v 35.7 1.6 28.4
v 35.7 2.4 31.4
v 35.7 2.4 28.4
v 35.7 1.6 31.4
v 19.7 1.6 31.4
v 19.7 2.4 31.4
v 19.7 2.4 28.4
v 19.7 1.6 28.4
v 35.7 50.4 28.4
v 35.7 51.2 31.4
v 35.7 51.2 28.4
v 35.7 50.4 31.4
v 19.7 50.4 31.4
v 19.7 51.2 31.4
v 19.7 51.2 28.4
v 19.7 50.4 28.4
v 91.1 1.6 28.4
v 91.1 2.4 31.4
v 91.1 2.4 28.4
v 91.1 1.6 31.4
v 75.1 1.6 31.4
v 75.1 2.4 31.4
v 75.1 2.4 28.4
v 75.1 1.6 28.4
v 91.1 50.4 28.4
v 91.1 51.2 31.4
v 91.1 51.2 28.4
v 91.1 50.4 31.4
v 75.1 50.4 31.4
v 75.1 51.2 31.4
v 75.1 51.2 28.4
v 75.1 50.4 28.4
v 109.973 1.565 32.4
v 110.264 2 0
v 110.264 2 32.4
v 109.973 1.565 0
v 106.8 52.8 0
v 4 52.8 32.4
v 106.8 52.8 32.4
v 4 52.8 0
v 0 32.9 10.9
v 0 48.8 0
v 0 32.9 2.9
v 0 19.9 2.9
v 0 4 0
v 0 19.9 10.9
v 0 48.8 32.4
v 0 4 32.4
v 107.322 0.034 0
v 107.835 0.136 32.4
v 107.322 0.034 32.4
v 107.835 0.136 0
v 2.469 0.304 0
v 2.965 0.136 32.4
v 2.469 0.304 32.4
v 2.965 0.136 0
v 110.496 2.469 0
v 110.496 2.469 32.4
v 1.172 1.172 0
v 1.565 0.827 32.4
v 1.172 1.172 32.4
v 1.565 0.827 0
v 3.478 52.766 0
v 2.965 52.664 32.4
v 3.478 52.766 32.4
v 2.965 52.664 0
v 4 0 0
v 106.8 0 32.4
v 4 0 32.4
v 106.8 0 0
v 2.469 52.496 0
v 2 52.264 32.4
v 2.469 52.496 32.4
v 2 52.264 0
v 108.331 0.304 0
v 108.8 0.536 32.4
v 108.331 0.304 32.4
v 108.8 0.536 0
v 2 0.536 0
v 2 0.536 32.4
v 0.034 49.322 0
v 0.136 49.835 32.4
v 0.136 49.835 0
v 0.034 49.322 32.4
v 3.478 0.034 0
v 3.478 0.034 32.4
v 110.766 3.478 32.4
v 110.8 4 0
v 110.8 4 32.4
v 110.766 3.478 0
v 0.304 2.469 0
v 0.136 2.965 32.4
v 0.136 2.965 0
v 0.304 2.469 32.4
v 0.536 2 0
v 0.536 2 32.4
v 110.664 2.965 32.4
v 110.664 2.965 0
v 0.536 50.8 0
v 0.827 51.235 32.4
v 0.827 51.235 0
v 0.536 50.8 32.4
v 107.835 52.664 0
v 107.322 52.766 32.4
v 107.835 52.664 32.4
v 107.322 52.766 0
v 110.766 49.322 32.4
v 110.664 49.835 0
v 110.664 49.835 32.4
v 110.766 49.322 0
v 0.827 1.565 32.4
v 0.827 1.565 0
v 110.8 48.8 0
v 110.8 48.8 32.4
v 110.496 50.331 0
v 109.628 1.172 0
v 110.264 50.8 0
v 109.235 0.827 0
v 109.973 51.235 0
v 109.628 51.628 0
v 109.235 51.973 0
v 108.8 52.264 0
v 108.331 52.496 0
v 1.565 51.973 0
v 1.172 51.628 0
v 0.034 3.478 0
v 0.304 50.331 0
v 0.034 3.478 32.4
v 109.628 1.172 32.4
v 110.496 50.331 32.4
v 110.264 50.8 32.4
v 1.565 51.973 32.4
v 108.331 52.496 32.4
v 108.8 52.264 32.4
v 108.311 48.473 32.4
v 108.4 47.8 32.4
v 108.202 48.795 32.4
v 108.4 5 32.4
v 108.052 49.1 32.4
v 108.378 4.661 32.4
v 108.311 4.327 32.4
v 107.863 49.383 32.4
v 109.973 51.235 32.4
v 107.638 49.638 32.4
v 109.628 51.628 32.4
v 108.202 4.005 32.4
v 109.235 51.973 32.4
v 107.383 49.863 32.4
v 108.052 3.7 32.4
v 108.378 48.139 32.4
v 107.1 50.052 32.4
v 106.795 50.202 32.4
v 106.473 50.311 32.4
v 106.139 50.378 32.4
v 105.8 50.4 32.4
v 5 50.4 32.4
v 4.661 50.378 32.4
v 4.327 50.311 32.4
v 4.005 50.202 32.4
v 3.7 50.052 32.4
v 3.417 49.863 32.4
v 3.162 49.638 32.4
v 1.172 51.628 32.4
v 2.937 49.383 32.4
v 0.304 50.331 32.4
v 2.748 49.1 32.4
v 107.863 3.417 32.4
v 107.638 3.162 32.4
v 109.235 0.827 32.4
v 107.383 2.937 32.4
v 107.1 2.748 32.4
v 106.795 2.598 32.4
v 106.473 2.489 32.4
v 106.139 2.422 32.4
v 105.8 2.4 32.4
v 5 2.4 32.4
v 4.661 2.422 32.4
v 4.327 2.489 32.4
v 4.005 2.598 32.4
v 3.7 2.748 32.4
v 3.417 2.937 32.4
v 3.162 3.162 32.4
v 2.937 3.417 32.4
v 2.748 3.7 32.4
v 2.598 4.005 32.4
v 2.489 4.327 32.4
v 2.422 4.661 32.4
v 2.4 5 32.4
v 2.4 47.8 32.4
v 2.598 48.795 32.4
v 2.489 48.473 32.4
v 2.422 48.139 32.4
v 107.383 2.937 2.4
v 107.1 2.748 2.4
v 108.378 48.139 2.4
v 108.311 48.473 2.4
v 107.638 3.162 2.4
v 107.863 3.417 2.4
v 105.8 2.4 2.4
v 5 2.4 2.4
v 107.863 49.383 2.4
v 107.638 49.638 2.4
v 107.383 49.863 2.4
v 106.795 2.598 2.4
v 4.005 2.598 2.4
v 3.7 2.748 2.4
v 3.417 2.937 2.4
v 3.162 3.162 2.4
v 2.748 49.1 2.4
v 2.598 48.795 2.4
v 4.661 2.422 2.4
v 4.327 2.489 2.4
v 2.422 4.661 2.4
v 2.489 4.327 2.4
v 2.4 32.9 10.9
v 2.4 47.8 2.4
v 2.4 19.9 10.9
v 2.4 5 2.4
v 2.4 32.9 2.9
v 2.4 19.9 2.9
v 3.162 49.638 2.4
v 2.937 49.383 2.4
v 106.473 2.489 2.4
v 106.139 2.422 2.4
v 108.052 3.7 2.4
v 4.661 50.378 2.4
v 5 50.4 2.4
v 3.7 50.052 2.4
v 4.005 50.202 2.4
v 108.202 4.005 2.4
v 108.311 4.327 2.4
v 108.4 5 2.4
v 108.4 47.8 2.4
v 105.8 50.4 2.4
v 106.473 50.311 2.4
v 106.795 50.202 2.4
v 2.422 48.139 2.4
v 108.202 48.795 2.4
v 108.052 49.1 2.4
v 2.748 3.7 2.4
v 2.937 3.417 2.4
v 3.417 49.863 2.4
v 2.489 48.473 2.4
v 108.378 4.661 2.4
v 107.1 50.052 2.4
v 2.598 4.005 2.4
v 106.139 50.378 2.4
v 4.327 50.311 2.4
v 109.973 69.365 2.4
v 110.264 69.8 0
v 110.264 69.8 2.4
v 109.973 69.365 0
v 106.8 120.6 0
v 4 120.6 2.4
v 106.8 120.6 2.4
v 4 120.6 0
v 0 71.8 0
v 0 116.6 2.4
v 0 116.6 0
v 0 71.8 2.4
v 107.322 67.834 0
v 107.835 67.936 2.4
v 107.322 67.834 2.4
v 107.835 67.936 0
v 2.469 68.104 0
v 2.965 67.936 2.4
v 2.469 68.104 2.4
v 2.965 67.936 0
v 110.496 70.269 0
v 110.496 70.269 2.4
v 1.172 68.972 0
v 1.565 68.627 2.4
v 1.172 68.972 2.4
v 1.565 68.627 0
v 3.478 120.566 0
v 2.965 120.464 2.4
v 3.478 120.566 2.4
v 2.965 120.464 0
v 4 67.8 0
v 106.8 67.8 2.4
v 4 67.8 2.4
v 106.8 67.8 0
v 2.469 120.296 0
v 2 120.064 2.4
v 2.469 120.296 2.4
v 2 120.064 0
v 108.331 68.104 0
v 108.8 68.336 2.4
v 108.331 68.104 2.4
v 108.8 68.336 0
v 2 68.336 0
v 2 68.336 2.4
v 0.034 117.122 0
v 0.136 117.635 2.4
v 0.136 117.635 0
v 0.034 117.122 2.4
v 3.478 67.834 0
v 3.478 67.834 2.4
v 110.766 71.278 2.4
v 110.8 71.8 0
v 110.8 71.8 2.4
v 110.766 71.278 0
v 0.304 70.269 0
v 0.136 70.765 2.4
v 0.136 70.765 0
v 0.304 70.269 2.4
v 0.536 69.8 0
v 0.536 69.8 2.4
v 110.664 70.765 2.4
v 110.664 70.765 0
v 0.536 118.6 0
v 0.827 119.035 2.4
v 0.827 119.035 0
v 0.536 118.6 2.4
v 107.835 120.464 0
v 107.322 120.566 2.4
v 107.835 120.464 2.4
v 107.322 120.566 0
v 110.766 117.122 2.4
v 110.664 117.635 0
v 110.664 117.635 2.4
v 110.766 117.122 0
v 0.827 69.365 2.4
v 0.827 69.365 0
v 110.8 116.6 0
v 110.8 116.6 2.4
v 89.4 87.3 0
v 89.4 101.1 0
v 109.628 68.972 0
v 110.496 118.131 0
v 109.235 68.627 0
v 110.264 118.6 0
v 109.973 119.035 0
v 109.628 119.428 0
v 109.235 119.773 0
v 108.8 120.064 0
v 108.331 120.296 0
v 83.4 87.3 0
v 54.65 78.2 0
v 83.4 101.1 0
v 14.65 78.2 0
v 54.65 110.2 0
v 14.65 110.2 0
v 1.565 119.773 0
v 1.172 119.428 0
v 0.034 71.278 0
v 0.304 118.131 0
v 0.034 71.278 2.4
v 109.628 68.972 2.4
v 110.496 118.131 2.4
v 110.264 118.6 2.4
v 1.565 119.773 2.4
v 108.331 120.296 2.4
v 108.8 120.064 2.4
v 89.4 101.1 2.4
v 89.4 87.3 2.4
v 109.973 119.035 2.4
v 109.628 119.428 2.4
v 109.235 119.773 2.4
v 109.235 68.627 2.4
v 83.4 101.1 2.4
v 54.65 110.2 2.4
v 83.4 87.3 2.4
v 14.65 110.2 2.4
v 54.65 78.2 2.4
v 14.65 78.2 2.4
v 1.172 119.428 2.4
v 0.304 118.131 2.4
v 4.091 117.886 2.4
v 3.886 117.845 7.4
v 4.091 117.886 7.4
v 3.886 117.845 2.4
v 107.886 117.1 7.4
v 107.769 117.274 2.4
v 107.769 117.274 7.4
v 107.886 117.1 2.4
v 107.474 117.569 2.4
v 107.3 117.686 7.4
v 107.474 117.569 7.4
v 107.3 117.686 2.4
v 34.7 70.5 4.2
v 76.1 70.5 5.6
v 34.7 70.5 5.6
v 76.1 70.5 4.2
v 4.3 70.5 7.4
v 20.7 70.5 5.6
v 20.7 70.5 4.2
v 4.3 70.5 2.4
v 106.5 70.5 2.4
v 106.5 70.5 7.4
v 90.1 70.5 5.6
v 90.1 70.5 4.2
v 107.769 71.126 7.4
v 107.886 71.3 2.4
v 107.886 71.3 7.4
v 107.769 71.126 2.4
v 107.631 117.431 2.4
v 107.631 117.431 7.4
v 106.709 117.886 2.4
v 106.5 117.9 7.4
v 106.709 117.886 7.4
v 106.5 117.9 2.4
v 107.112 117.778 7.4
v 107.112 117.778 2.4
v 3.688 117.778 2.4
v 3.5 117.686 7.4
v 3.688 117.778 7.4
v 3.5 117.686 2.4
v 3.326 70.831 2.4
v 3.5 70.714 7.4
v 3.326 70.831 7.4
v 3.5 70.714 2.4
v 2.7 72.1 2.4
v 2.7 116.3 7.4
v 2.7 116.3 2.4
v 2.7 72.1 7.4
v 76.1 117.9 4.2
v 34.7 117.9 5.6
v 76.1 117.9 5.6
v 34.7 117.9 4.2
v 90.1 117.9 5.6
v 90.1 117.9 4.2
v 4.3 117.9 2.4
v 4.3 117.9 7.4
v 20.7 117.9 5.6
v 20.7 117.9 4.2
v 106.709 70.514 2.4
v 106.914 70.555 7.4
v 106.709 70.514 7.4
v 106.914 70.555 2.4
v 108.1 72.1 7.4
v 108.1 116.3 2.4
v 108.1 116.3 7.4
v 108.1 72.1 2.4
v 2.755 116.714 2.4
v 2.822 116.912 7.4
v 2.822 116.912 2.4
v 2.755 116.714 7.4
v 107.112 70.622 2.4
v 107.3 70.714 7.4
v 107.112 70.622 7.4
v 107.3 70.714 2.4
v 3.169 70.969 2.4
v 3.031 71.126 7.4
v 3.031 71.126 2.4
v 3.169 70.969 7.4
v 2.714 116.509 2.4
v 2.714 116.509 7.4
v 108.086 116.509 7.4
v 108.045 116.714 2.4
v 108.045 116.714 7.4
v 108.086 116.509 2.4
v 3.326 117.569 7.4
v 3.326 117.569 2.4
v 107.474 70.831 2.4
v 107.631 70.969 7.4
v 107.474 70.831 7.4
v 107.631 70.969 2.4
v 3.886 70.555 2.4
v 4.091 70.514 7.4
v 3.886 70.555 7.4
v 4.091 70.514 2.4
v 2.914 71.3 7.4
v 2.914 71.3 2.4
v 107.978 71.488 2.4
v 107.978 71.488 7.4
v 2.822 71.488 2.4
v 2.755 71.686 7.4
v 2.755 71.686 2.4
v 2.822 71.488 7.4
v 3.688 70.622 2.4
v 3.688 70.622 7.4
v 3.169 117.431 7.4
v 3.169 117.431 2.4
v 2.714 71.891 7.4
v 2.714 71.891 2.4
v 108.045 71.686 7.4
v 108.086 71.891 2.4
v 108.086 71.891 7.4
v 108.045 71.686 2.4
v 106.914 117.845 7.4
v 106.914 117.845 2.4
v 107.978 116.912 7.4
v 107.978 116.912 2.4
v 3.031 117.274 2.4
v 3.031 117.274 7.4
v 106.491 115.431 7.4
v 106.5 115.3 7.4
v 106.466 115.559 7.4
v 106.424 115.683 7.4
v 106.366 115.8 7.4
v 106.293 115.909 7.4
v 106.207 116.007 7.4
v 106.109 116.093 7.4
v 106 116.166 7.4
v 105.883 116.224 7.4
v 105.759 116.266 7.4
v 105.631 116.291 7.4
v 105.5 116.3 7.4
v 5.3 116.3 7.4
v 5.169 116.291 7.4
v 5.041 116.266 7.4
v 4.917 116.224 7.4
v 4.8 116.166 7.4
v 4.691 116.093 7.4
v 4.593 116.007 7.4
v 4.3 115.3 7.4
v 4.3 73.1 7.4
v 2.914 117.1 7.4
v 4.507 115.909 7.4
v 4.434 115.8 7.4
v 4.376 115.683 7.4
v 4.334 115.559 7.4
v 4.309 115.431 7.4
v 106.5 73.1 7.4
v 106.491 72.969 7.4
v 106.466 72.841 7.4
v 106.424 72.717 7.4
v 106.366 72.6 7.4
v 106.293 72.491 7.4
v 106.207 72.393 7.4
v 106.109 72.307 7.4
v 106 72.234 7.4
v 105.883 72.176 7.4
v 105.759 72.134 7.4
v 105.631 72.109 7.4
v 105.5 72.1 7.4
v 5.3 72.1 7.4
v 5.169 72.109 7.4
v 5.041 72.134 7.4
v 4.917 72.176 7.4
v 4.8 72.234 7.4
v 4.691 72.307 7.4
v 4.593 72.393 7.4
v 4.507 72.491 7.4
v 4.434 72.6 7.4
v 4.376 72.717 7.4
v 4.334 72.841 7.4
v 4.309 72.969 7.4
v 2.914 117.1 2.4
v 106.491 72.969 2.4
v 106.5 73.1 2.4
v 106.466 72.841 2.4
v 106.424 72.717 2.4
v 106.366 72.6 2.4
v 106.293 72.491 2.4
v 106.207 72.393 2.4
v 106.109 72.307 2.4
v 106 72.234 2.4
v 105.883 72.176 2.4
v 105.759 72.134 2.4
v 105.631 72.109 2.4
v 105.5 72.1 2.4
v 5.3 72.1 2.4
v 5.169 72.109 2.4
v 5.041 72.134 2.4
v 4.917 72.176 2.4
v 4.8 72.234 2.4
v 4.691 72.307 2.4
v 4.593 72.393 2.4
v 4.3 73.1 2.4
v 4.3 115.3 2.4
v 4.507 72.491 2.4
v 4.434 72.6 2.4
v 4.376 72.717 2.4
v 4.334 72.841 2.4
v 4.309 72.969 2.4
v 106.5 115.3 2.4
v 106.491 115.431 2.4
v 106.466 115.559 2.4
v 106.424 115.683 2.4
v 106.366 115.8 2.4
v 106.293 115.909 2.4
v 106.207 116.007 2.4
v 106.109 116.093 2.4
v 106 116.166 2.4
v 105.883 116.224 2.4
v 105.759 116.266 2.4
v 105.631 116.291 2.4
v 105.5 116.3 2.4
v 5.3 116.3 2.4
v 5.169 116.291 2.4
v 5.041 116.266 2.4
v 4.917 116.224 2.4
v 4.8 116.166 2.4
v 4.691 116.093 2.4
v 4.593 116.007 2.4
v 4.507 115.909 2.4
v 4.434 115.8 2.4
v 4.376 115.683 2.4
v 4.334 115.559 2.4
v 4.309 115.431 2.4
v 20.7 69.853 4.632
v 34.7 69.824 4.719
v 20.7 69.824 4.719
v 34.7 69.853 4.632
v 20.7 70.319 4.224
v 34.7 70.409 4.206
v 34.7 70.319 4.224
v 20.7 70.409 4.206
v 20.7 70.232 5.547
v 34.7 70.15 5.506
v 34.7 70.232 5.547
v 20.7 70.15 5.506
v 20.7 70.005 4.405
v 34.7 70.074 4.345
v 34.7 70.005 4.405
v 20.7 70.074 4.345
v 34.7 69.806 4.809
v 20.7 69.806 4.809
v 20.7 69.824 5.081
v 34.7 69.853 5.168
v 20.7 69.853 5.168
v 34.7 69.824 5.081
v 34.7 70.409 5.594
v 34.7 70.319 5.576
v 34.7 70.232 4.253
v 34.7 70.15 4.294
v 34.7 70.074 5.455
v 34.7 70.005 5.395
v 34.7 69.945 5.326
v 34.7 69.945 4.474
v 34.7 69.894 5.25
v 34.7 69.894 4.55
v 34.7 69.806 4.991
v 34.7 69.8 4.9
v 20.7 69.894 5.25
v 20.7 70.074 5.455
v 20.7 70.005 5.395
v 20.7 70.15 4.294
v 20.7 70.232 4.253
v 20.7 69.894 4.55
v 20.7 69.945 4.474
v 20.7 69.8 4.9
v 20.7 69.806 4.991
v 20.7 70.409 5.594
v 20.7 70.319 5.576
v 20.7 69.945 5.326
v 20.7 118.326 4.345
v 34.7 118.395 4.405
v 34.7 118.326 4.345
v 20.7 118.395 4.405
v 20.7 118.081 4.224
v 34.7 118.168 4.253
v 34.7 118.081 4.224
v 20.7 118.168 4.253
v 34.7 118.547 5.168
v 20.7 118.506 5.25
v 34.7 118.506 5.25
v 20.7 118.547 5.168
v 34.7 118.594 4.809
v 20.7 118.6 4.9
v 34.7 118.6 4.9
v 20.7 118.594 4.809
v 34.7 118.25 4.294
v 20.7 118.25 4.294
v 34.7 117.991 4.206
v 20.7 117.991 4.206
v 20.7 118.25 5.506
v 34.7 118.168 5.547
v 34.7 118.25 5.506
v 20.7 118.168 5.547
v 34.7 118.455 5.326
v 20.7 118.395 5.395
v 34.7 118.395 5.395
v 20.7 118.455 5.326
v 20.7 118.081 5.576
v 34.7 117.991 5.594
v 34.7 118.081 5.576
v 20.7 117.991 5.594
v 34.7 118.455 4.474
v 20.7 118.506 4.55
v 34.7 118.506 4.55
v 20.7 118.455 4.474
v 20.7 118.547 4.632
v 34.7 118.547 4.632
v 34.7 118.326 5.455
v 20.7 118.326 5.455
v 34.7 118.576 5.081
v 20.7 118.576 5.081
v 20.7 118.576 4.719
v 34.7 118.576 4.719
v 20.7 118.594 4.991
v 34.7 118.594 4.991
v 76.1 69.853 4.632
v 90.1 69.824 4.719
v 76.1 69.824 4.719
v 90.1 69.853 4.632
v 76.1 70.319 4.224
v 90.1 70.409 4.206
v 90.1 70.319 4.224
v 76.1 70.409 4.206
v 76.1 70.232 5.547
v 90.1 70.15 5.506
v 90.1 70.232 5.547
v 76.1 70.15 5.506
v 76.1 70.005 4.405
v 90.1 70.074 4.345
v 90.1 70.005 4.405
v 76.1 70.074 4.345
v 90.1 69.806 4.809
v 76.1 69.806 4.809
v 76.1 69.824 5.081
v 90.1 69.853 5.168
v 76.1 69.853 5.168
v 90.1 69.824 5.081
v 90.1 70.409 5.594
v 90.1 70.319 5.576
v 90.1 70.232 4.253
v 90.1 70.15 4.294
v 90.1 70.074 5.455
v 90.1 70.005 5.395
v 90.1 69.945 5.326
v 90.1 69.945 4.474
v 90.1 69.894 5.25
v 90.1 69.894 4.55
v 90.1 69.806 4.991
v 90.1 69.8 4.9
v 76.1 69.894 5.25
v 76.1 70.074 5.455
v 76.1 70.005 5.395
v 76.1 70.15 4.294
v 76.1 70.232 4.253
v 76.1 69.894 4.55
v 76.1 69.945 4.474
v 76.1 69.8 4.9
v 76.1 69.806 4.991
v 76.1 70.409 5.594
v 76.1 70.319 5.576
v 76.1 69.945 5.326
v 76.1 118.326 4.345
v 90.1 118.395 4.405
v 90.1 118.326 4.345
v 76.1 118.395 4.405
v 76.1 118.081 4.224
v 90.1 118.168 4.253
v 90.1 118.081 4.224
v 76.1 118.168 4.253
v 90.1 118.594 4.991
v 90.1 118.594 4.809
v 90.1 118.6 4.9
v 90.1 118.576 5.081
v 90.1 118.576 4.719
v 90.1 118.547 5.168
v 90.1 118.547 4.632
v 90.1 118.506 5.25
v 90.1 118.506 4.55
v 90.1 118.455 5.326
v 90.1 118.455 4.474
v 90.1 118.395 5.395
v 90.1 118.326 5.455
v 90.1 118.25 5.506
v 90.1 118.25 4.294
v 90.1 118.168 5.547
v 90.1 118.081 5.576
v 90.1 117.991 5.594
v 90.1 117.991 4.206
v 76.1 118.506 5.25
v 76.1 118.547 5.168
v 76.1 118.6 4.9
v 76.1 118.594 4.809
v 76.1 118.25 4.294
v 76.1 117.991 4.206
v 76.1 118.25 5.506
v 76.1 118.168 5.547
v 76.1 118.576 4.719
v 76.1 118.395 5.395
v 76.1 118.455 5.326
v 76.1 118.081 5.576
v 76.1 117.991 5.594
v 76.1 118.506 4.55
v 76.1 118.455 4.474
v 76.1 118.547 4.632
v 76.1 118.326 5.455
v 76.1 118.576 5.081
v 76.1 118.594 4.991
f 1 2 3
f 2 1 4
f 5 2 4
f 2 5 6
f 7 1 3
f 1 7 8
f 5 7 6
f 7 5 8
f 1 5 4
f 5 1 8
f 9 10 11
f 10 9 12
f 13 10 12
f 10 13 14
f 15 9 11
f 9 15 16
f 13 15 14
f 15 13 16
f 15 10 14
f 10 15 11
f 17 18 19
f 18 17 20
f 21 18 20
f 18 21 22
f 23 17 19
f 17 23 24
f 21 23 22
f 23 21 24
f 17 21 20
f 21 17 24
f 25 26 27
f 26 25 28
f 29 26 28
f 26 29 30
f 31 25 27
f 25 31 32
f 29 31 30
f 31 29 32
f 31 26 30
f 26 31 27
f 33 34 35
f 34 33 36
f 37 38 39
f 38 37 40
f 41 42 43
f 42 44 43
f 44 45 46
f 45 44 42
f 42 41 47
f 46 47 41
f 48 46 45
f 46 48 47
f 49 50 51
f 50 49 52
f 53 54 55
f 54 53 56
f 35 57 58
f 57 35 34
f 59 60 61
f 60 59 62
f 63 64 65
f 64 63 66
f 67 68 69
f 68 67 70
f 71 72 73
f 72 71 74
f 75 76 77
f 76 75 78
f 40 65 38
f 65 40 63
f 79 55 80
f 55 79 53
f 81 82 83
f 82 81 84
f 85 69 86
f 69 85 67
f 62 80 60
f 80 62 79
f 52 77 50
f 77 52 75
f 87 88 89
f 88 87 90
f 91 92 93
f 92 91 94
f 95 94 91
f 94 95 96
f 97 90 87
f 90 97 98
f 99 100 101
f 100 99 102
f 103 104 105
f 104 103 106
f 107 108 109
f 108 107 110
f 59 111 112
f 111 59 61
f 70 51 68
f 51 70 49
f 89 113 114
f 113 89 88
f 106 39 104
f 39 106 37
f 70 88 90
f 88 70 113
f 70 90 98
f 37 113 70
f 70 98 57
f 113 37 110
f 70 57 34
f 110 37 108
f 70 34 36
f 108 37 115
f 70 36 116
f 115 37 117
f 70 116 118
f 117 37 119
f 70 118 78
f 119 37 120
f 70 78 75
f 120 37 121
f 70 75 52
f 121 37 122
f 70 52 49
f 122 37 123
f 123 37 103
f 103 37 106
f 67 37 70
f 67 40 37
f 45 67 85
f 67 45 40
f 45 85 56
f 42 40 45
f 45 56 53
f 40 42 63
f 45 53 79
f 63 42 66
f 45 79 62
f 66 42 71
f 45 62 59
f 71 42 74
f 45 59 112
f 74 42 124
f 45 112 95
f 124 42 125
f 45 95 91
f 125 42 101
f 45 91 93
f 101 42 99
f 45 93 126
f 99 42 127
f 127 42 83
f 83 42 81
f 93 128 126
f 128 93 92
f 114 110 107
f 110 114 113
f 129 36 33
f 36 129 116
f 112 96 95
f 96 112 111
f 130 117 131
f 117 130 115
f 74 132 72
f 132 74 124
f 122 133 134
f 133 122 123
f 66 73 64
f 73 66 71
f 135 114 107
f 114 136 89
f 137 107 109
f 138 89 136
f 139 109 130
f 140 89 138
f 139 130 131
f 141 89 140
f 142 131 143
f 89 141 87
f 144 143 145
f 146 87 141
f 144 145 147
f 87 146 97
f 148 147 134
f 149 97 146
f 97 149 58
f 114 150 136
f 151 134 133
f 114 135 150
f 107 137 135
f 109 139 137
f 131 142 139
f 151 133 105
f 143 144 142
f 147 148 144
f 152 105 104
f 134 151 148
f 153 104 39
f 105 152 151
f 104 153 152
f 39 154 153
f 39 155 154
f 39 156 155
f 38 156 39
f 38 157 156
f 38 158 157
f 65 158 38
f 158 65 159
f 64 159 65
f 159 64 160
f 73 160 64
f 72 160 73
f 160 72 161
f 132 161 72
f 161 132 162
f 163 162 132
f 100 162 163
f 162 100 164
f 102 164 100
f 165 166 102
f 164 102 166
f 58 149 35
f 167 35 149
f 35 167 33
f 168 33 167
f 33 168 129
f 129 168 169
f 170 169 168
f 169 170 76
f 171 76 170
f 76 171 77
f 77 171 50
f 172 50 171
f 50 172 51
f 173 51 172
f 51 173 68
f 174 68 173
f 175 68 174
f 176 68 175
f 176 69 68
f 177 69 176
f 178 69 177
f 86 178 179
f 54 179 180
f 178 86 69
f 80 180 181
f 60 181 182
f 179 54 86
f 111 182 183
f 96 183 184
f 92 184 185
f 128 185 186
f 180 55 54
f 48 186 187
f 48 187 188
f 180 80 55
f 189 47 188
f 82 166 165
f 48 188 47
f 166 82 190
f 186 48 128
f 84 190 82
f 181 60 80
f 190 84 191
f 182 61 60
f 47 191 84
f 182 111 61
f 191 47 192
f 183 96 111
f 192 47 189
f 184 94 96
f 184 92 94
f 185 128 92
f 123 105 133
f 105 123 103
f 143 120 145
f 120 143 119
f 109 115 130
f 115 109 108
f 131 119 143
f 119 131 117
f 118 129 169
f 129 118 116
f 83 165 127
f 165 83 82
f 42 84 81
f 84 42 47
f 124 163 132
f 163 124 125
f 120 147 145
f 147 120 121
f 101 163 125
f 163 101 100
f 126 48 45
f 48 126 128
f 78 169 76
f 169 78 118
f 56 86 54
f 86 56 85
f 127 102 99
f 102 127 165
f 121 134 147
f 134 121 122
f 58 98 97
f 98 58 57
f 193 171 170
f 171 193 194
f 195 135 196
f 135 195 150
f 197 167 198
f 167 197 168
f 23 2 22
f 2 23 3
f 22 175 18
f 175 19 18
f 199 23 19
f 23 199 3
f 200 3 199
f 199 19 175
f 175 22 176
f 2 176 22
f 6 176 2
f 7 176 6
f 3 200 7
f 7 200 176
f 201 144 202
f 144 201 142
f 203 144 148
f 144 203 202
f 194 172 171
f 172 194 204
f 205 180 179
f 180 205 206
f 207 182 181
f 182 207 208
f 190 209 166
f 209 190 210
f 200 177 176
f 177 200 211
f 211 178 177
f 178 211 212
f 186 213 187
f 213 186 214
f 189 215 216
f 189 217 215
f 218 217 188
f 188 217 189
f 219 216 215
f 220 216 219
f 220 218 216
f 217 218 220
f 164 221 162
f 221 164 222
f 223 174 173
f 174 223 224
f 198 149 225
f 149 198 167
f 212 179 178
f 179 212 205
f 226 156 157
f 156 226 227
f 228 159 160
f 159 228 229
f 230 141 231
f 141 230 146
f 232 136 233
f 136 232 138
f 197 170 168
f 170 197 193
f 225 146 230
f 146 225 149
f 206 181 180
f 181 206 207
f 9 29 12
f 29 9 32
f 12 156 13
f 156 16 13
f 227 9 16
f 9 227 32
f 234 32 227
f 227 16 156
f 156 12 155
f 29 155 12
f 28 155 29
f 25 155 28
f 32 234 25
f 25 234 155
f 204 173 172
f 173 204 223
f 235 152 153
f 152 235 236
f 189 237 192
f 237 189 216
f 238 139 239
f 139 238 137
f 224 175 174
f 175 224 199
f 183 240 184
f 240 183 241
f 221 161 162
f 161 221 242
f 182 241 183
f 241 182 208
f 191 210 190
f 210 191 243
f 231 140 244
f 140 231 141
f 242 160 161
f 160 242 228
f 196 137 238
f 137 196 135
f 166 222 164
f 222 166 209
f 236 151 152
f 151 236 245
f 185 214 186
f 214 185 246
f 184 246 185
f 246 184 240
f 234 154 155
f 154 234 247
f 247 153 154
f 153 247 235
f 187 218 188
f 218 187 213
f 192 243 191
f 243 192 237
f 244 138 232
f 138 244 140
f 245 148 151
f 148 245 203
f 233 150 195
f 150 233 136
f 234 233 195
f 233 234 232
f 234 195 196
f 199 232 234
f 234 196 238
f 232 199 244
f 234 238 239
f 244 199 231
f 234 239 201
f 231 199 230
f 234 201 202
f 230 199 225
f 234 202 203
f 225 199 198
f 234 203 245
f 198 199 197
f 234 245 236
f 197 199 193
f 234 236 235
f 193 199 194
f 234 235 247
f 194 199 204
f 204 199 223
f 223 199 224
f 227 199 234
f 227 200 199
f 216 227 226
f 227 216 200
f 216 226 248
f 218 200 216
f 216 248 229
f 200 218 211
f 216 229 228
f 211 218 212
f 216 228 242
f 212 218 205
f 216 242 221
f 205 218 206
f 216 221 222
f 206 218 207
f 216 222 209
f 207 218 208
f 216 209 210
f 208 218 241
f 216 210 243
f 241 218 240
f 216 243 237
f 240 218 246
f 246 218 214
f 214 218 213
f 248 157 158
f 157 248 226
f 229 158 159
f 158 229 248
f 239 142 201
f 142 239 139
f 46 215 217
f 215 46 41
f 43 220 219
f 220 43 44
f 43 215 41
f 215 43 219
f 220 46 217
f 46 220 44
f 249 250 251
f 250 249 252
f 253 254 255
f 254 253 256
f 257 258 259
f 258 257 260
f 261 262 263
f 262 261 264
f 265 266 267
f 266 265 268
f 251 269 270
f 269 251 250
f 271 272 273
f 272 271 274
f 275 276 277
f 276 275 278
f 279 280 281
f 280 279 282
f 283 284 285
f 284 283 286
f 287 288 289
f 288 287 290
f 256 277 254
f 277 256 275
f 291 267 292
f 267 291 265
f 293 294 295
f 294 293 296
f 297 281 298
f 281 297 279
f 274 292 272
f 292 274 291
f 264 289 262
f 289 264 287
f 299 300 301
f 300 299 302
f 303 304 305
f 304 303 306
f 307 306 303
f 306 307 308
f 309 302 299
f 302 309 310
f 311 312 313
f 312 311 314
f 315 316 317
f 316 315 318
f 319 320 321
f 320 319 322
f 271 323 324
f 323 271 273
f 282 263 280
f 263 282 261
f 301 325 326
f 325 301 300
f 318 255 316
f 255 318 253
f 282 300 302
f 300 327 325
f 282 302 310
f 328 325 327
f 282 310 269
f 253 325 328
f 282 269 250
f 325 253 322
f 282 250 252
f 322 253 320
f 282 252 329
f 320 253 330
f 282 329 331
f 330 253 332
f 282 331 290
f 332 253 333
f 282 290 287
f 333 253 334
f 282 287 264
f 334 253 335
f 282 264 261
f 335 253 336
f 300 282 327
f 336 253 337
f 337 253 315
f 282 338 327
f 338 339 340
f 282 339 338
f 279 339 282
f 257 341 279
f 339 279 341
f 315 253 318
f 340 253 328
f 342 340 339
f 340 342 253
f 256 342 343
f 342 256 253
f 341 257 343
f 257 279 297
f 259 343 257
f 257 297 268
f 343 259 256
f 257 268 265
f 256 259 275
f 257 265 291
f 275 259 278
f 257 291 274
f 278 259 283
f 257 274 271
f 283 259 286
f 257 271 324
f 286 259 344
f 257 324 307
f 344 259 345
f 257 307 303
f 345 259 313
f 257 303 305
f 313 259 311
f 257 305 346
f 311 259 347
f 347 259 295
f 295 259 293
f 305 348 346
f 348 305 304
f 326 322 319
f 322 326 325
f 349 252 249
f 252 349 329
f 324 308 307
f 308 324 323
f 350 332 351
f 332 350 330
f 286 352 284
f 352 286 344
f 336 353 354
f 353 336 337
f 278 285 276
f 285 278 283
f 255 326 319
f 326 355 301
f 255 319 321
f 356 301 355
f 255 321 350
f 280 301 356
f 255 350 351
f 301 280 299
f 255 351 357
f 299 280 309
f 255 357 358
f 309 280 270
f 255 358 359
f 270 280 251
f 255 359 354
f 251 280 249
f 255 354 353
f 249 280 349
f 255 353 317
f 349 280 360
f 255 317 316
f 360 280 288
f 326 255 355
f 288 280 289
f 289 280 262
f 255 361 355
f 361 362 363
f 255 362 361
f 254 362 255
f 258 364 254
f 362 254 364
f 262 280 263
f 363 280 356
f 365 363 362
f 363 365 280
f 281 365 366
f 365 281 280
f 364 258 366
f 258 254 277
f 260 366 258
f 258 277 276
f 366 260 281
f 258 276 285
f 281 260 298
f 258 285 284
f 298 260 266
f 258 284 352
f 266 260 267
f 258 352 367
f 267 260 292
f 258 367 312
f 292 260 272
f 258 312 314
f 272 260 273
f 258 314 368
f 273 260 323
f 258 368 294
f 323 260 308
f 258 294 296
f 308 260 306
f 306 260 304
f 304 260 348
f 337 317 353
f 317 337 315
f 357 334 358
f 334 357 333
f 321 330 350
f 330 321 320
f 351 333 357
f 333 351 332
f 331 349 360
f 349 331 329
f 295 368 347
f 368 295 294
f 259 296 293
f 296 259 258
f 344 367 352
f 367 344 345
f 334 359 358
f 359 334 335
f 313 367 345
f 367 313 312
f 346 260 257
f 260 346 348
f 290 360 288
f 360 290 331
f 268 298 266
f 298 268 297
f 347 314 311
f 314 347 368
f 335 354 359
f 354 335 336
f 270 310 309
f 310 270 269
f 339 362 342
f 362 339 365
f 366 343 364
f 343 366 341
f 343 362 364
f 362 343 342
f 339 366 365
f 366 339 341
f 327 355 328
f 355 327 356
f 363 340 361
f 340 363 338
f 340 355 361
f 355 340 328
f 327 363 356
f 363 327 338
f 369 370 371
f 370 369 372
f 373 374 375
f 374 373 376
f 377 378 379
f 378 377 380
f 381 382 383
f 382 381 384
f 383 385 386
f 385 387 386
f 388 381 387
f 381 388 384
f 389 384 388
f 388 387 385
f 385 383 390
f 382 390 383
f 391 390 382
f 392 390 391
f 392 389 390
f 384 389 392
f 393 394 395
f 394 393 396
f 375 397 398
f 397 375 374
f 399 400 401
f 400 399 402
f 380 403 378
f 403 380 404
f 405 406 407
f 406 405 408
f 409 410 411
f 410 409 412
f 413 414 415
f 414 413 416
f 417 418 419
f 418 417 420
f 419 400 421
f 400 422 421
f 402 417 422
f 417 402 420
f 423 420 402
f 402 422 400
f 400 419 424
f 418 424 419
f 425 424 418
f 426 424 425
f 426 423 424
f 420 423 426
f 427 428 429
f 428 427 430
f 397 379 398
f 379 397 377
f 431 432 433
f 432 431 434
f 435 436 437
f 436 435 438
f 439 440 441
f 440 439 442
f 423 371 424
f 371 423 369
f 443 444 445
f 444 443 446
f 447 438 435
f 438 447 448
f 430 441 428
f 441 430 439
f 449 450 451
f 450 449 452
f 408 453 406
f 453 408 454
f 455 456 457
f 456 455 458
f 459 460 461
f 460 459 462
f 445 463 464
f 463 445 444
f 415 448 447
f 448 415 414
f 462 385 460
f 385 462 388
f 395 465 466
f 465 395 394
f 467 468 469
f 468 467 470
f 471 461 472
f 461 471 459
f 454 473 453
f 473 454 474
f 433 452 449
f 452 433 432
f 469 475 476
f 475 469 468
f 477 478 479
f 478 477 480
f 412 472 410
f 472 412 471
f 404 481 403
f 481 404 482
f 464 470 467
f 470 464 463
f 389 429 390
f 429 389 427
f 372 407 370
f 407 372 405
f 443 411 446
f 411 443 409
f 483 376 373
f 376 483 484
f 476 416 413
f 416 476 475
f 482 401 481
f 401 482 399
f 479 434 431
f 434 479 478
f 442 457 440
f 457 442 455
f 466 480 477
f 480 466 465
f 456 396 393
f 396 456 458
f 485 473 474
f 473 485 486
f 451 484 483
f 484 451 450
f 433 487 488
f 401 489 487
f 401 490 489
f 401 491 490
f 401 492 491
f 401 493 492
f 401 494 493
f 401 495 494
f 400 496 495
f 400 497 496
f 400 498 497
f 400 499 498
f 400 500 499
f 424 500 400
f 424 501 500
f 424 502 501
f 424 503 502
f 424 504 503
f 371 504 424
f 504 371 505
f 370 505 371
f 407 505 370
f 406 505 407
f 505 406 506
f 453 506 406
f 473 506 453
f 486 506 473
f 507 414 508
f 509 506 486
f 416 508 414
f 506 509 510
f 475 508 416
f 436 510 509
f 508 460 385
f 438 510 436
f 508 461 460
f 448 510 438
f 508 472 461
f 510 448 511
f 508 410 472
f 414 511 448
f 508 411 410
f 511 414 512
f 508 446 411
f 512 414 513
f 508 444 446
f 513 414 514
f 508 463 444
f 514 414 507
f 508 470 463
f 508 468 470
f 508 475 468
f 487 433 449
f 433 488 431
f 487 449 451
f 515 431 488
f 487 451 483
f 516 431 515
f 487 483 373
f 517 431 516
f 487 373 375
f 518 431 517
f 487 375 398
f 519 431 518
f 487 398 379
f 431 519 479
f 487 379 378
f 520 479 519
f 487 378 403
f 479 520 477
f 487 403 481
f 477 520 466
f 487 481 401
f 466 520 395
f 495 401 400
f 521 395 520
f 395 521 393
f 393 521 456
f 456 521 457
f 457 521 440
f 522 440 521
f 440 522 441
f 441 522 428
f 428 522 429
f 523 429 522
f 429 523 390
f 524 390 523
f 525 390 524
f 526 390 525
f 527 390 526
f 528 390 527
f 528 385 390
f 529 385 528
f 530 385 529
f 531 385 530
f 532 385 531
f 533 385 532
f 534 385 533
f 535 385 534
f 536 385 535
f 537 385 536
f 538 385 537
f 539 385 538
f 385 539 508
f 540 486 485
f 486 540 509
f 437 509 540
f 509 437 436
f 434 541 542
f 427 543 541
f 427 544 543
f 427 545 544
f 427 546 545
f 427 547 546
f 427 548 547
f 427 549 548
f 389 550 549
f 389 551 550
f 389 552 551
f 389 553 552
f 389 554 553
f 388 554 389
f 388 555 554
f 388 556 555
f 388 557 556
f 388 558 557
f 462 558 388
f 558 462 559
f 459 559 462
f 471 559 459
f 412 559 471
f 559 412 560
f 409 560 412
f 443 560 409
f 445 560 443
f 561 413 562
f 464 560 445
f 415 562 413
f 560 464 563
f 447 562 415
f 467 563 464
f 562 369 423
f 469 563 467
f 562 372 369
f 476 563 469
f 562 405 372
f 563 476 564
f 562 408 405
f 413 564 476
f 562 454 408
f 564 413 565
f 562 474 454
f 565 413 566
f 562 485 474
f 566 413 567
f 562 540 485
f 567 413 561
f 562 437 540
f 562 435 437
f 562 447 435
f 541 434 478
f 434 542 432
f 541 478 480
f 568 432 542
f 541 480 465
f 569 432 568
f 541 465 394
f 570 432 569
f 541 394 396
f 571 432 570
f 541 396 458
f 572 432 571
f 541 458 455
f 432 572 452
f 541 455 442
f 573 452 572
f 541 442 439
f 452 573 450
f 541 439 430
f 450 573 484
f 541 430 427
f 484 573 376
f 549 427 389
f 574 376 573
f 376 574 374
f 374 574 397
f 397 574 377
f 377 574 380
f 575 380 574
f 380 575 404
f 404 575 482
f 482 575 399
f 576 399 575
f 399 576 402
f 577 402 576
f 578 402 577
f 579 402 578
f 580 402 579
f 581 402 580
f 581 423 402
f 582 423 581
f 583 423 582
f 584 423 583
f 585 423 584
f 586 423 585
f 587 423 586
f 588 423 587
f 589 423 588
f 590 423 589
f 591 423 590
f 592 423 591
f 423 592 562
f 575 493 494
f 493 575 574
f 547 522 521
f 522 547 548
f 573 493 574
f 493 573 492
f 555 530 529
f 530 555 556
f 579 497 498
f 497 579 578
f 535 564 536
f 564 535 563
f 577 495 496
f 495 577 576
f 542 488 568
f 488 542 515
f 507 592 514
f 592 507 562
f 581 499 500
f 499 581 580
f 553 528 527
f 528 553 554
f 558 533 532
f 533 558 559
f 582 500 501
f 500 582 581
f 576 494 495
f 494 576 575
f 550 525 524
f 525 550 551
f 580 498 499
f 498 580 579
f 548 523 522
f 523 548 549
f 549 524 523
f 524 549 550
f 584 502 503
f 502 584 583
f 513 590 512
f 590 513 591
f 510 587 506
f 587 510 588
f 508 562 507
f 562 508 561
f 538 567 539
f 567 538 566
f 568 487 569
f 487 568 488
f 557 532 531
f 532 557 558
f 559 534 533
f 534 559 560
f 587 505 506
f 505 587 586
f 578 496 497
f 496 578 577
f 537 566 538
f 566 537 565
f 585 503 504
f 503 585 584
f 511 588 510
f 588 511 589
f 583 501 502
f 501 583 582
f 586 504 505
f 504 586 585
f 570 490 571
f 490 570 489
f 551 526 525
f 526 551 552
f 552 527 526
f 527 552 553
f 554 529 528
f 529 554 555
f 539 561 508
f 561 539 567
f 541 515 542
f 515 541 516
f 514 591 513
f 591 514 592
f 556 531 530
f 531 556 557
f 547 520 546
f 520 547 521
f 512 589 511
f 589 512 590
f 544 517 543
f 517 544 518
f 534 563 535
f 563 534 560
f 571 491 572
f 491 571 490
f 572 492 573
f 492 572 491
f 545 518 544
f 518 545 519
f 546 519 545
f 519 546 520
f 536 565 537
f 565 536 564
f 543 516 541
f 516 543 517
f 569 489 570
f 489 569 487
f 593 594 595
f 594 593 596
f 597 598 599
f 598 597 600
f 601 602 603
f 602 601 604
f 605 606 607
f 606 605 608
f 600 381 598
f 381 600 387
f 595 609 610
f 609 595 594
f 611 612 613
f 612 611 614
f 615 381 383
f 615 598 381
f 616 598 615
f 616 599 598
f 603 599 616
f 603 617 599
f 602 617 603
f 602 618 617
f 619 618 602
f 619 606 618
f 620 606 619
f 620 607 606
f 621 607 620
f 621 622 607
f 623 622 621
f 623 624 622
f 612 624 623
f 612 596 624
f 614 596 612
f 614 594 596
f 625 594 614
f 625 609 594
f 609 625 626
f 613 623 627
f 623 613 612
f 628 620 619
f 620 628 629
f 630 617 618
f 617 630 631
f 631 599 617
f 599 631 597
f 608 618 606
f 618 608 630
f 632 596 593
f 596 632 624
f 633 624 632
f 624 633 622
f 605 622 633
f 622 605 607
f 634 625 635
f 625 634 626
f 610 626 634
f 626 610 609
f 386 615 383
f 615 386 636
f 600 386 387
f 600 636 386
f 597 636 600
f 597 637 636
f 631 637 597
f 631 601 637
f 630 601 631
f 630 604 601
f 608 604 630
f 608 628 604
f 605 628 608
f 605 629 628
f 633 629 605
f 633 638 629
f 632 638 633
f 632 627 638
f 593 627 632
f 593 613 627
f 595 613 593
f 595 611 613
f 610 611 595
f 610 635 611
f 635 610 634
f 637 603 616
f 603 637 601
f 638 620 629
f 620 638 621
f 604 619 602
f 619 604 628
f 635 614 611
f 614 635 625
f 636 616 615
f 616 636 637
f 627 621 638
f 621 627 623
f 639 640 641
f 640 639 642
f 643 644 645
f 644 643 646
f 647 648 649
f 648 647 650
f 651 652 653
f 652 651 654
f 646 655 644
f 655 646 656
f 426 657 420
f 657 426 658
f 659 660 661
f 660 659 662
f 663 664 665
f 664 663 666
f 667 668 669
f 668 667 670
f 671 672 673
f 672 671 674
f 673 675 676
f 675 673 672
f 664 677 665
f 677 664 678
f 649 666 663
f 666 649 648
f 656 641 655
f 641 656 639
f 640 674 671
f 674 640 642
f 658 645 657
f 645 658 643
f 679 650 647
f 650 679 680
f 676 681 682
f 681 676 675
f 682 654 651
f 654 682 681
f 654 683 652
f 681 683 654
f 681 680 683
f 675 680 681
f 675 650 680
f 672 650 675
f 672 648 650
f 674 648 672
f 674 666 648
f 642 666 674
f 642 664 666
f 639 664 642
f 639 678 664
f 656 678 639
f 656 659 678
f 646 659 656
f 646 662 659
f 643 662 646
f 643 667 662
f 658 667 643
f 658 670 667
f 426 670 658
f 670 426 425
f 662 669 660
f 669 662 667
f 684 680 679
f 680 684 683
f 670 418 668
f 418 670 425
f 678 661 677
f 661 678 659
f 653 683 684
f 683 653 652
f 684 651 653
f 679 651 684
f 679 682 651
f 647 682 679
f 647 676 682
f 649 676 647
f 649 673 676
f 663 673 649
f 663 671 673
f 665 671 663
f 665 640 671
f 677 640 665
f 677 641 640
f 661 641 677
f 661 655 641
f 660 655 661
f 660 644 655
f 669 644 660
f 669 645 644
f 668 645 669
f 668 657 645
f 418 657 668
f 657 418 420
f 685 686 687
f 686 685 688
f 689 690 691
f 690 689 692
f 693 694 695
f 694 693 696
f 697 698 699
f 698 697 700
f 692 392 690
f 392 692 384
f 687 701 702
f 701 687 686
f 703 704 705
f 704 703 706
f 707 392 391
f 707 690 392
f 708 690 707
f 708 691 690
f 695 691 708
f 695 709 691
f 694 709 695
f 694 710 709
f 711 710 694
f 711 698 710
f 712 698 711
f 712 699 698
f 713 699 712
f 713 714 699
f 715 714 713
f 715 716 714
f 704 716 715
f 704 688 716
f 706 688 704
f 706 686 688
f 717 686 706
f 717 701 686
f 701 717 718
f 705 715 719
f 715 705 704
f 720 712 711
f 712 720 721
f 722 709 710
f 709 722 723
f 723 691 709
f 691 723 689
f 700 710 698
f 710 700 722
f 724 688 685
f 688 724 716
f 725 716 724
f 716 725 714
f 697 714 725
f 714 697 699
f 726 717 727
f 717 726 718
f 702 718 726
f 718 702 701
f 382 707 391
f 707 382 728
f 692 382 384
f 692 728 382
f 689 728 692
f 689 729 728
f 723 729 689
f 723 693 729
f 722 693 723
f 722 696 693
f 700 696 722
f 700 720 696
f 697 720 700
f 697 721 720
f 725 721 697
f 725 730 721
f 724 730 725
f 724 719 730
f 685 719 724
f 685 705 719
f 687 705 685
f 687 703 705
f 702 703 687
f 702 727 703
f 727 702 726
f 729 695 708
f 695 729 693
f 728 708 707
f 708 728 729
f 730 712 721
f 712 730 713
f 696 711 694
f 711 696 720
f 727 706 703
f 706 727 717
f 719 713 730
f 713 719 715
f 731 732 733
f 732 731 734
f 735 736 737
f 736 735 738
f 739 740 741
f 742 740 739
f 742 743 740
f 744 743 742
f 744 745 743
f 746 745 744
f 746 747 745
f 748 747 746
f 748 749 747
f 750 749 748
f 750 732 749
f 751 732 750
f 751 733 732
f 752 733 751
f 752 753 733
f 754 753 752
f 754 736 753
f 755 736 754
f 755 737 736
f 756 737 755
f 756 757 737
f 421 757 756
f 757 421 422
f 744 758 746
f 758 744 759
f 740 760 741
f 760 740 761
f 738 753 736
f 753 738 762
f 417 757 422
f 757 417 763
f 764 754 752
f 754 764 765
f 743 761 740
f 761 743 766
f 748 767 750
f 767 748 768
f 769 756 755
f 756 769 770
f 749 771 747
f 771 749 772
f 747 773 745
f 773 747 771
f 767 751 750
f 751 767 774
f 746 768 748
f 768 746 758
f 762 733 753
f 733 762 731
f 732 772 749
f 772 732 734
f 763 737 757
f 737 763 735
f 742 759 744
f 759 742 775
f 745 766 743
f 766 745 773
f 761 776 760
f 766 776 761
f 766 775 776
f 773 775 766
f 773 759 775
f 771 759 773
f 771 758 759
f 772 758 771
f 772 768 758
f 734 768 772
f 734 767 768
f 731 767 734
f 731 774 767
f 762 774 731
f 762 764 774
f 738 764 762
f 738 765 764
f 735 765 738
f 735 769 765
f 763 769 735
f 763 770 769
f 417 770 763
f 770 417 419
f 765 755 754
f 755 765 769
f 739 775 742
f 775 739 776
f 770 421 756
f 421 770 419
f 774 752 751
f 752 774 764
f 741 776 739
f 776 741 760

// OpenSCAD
// Receiver enclosure - IoT Smart Safety Device
// NodeMCU ESP8266 + HC-12 + 1.8" SPI TFT
// Two parts, screw-free snap-fit lid. All dimensions in mm.
// mode: "print" (both parts flat), "assembled", "box", "lid"

mode = "print";

$fn = 48;

// ---------- component sizes ----------
nodemcu = [60, 35];
tft     = [60, 35];
hc12    = [28, 13];
tft_window = [40, 32];   // screen opening in the lid

// ---------- enclosure parameters ----------
wall  = 2.4;
floor_t = 2.4;
lid_t = 2.4;
Li = 106;                // inner length
Wi = 48;                 // inner width
Hi = 30;                 // inner height (wiring clearance)
R  = 4;                  // outer corner radius
clr = 0.3;               // lid-to-box clearance
lip_h = 5;
lip_w = 1.6;
gd = 0.8;                // snap groove depth
bump_d = 1.4;            // snap bump diameter
fit = 0.5;               // extra pocket clearance for boards

Lo = Li + 2*wall;
Wo = Wi + 2*wall;
Ho = floor_t + Hi;
// HC-12 mounted standing up (same as the transmitter): only its 13 mm width
// shows on top as a narrow slot; the antenna stands out of the slot.
hc_slot   = 6;            // opening width in the top surface = 0.6 cm
hc_len    = hc12[1] + 0.8; // slot length = module width + clearance
hc_gap    = 3.6;          // snug channel for the PCB, centred under the slot
hc_rib_t  = 2.2;          // thickness of each retaining rib
hc_stand  = false;        // true = add the retaining ribs for the HC-12 (removed, as on the transmitter)
hc_rib_h  = 14;           // ribs hang this far below the lid
hc_cx     = wall + 84;    // slot centre X (outer coords)
hc_cy     = Wo/2;         // slot centre Y

module rrect(l, w, h, r) {
    hull() for (x = [r, l-r], y = [r, w-r])
        translate([x, y, 0]) cylinder(r = r, h = h);
}

// ---------- BOX ----------
module box() {
    difference() {
        rrect(Lo, Wo, Ho, R);
        // cavity
        translate([wall, wall, floor_t]) rrect(Li, Wi, Hi + 1, R - wall + 1);
        // snap grooves (inner face of both long walls)
        for (gx = [Lo*0.25, Lo*0.75]) {
            translate([gx - 8, wall - gd, Ho - 4]) cube([16, gd + 0.01, 3]);
            translate([gx - 8, Wo - wall - 0.01, Ho - 4]) cube([16, gd + 0.01, 3]);
        }
        // micro-USB opening, short wall at NodeMCU end
        translate([-1, Wo/2 - 6.5, floor_t + 0.5])
            cube([wall + 2, 13, 8]);
    }
}

// ---------- LID (print orientation: outer face on the bed) ----------
module lid() {
    difference() {
        rrect(Lo, Wo, lid_t, R);
        // TFT window
        tx = wall + 2 + (tft[0] + fit - tft_window[0]) / 2;
        ty = Wo/2 - tft_window[1]/2;
        translate([tx, ty, -1]) cube([tft_window[0], tft_window[1], lid_t + 2]);
        // HC-12 standing slot
        translate([hc_cx - hc_slot/2, hc_cy - hc_len/2, -1])
            cube([hc_slot, hc_len, lid_t + 2]);
    }
    // inner lip with snap bumps
    translate([0, 0, lid_t]) difference() {
        translate([wall + clr, wall + clr, 0])
            rrect(Li - 2*clr, Wi - 2*clr, lip_h, R - wall);
        translate([wall + clr + lip_w, wall + clr + lip_w, -1])
            rrect(Li - 2*clr - 2*lip_w, Wi - 2*clr - 2*lip_w, lip_h + 2, 1);
    }
    for (gx = [Lo*0.25, Lo*0.75]) {
        translate([gx - 7, wall + clr, lid_t + lip_h - 2.5])
            rotate([0, 90, 0]) cylinder(d = bump_d, h = 14);
        translate([gx - 7, Wo - wall - clr, lid_t + lip_h - 2.5])
            rotate([0, 90, 0]) cylinder(d = bump_d, h = 14);
    }
    if (hc_stand) hc_ribs();
}

// two ribs hanging from the lid that the standing HC-12 PCB clips between
module hc_ribs() {
    difference() {
        union() {
            translate([hc_cx - hc_gap/2 - hc_rib_t, hc_cy - hc_len/2, lid_t - 0.5])
                cube([hc_rib_t, hc_len, hc_rib_h + 0.5]);
            translate([hc_cx + hc_gap/2, hc_cy - hc_len/2, lid_t - 0.5])
                cube([hc_rib_t, hc_len, hc_rib_h + 0.5]);
        }
        // keep the slot itself clear
        translate([hc_cx - hc_slot/2, hc_cy - hc_len/2 - 1, -1])
            cube([hc_slot, hc_len + 2, lid_t + 2]);
    }
}

// ---------- output ----------
if (mode == "box") box();
else if (mode == "lid") lid();
else if (mode == "assembled") {
    box();
    translate([0, Wo, Ho + lid_t]) rotate([180, 0, 0]) lid();
} else {
    box();
    translate([0, Wo + 15, 0]) lid();
}
